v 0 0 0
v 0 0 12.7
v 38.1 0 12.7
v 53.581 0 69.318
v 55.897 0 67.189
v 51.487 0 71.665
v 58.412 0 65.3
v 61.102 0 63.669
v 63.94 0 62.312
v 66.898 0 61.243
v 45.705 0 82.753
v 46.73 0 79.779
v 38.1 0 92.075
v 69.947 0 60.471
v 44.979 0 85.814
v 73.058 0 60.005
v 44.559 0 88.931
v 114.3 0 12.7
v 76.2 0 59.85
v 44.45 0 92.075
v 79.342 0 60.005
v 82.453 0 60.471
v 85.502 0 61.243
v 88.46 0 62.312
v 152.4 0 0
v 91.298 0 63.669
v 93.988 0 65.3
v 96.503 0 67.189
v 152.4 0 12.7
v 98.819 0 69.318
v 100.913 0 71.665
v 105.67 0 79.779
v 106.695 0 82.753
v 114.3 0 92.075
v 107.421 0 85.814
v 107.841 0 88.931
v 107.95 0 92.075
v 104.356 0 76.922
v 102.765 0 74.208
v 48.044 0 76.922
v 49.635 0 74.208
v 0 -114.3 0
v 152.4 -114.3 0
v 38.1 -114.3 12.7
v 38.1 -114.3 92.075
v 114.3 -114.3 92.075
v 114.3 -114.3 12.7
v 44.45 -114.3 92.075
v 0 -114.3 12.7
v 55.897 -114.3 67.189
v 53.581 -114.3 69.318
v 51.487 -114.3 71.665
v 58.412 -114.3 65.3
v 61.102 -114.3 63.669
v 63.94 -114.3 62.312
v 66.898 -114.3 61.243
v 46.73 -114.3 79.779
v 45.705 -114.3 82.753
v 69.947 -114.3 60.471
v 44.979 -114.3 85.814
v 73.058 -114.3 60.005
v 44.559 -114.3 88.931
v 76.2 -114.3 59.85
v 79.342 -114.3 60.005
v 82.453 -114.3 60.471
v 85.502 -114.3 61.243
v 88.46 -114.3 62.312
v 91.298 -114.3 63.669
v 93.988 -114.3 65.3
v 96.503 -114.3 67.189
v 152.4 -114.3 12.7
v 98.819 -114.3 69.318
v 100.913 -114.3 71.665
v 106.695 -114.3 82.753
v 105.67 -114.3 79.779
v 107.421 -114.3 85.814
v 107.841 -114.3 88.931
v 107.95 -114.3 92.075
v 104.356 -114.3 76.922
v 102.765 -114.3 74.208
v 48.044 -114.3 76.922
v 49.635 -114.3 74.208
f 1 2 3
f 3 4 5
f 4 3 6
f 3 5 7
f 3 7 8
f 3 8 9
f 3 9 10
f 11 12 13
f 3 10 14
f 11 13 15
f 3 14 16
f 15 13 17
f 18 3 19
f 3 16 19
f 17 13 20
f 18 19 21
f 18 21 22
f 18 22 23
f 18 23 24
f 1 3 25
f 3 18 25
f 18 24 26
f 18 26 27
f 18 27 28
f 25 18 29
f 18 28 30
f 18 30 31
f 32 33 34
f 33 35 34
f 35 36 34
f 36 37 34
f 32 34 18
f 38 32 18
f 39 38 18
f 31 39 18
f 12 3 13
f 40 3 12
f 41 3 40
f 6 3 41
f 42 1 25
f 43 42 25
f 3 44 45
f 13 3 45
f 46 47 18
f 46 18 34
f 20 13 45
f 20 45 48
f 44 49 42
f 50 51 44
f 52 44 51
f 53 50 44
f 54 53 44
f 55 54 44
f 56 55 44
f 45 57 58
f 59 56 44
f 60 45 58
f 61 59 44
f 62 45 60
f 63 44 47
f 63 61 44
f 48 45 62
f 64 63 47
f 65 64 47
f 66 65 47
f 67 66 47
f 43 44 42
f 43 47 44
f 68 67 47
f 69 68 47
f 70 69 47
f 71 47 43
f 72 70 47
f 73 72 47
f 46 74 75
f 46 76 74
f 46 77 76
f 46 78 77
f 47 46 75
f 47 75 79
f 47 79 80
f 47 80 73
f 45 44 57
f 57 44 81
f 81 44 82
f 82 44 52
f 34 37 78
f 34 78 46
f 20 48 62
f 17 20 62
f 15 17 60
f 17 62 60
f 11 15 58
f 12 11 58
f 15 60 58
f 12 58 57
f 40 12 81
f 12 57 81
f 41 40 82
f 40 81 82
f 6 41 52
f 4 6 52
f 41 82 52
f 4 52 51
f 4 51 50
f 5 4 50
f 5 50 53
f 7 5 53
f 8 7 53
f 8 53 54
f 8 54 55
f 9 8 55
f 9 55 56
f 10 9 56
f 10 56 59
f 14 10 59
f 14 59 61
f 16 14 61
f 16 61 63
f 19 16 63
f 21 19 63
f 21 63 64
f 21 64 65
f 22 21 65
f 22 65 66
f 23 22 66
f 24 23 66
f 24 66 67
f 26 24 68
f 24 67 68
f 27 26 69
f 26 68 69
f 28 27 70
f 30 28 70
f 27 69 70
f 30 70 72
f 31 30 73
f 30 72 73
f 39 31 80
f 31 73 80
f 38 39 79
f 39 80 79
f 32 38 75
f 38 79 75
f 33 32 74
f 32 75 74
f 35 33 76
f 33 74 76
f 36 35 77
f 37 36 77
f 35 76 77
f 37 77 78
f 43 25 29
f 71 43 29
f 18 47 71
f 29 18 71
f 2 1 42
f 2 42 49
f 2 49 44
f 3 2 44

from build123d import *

# Parameters (mm, degrees)
F0_W     = 152.4
F0_H     = 92.075
F1_DEPTH = 114.3
F2_W     = 38.1
F2_H     = 79.375
F3_DEPTH = 114.301
F5_DEPTH = 114.301


with BuildPart() as f1:
    # F0 (on Front) → F1 (new body)
    with BuildSketch(Plane.XZ):
        with Locations((76.2, 46.0375)):
            Rectangle(F0_W, F0_H)
    extrude(amount=F1_DEPTH)

    # F2 (on face) → F3 (cut, through all)
    with BuildSketch(Plane.XZ.offset(114.3)):
        with Locations((19.05, 52.3875)):
            Rectangle(F2_W, F2_H)
        with Locations((133.35, 52.3875)):
            Rectangle(F2_W, F2_H)
    extrude(amount=-F3_DEPTH, mode=Mode.SUBTRACT)

    # F4 (on face) → F5 (cut, through all)
    with BuildSketch(Plane.XZ.offset(114.3)):
        with BuildLine():
            Line((107.95, 92.075), (44.45, 92.075))
            ThreePointArc((44.45, 92.075), (76.2, 59.849693), (107.95, 92.075))
        make_face()
    extrude(amount=-F5_DEPTH, mode=Mode.SUBTRACT)


solid = f1.part
